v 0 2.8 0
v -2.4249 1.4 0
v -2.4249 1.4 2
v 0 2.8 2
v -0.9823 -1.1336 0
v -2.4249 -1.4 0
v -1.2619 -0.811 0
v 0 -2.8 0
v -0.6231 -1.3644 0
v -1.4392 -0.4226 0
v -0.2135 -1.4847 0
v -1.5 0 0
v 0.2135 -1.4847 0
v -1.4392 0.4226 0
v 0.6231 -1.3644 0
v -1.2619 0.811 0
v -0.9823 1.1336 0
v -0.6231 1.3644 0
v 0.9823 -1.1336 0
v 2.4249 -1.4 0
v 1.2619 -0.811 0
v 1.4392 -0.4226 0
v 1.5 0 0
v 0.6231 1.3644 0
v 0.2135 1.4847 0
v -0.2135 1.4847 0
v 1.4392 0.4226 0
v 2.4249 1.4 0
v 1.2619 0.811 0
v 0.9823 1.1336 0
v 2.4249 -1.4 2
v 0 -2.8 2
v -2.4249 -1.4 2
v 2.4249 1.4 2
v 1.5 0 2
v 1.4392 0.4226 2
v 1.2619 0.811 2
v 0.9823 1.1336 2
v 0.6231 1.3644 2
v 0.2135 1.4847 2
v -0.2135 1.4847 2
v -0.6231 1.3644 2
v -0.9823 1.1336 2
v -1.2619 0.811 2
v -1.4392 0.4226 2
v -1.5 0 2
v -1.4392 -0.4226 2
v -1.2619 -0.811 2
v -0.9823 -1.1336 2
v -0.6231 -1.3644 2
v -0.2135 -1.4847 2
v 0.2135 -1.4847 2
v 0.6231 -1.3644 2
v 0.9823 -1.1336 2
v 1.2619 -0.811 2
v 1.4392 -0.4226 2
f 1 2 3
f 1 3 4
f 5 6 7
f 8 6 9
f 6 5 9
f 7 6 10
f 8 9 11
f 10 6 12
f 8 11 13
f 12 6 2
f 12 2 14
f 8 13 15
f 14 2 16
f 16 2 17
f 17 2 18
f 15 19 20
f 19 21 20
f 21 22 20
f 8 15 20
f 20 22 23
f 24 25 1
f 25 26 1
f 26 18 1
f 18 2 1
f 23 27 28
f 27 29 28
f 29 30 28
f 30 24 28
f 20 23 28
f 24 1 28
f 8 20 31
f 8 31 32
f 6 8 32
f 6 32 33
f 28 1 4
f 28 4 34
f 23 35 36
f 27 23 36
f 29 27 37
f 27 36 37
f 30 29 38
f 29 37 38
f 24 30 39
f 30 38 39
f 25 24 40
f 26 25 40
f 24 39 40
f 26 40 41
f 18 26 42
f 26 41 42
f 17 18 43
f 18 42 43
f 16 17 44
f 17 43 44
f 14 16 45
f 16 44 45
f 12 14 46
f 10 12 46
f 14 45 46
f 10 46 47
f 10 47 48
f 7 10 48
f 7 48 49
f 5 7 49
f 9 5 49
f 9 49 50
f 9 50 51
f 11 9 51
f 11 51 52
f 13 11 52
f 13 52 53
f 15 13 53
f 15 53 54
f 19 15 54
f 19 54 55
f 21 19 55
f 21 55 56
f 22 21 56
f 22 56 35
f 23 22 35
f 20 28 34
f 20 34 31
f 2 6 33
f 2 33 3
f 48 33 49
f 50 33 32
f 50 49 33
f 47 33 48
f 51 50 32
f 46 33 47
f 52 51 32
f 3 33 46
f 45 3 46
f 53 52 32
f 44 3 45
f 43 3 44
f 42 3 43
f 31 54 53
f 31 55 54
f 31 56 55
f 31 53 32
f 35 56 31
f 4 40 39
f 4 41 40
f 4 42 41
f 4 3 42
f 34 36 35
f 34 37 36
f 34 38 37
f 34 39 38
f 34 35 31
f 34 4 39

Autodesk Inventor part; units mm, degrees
ref_plane "YZ Plane" through (0, 0, 0) normal (1, 0, 0) x (0, 1, 0)
ref_plane "XZ Plane" through (0, 0, 0) normal (0, 1, 0) x (-1, 0, 0)
ref_plane "XY Plane" through (0, 0, 0) normal (0, 0, 1) x (1, 0, 0)
sketch "Sketch1" plane through (0, 0, 0) normal (0, 0, 1) x (1, 0, 0)
  line L0 (0, -2.8) -> (-2.4249, -1.4)
  line L1 (-2.4249, -1.4) -> (-2.4249, 1.4)
  line L2 (-2.4249, 1.4) -> (0, 2.8)
  line L3 (0, 2.8) -> (2.4249, 1.4)
  line L4 (2.4249, 1.4) -> (2.4249, -1.4)
  line L5 (2.4249, -1.4) -> (0, -2.8)
  point P0 (0, 0)
  point P1 (0, 0)
  dimension "d0" = 2.8
extrude "Extrusion1" add sketch "Sketch1" along normal blind 2
sketch "Sketch2" plane through (0, 0, 2) normal (0, 0, 1) x (1, 0, 0)
  circle A0 centre (0, 0) radius 1.5
  dimension "d3" = 3
extrude "Extrusion2" cut sketch "Sketch2" against normal through all
properties part number "M3_nut"
